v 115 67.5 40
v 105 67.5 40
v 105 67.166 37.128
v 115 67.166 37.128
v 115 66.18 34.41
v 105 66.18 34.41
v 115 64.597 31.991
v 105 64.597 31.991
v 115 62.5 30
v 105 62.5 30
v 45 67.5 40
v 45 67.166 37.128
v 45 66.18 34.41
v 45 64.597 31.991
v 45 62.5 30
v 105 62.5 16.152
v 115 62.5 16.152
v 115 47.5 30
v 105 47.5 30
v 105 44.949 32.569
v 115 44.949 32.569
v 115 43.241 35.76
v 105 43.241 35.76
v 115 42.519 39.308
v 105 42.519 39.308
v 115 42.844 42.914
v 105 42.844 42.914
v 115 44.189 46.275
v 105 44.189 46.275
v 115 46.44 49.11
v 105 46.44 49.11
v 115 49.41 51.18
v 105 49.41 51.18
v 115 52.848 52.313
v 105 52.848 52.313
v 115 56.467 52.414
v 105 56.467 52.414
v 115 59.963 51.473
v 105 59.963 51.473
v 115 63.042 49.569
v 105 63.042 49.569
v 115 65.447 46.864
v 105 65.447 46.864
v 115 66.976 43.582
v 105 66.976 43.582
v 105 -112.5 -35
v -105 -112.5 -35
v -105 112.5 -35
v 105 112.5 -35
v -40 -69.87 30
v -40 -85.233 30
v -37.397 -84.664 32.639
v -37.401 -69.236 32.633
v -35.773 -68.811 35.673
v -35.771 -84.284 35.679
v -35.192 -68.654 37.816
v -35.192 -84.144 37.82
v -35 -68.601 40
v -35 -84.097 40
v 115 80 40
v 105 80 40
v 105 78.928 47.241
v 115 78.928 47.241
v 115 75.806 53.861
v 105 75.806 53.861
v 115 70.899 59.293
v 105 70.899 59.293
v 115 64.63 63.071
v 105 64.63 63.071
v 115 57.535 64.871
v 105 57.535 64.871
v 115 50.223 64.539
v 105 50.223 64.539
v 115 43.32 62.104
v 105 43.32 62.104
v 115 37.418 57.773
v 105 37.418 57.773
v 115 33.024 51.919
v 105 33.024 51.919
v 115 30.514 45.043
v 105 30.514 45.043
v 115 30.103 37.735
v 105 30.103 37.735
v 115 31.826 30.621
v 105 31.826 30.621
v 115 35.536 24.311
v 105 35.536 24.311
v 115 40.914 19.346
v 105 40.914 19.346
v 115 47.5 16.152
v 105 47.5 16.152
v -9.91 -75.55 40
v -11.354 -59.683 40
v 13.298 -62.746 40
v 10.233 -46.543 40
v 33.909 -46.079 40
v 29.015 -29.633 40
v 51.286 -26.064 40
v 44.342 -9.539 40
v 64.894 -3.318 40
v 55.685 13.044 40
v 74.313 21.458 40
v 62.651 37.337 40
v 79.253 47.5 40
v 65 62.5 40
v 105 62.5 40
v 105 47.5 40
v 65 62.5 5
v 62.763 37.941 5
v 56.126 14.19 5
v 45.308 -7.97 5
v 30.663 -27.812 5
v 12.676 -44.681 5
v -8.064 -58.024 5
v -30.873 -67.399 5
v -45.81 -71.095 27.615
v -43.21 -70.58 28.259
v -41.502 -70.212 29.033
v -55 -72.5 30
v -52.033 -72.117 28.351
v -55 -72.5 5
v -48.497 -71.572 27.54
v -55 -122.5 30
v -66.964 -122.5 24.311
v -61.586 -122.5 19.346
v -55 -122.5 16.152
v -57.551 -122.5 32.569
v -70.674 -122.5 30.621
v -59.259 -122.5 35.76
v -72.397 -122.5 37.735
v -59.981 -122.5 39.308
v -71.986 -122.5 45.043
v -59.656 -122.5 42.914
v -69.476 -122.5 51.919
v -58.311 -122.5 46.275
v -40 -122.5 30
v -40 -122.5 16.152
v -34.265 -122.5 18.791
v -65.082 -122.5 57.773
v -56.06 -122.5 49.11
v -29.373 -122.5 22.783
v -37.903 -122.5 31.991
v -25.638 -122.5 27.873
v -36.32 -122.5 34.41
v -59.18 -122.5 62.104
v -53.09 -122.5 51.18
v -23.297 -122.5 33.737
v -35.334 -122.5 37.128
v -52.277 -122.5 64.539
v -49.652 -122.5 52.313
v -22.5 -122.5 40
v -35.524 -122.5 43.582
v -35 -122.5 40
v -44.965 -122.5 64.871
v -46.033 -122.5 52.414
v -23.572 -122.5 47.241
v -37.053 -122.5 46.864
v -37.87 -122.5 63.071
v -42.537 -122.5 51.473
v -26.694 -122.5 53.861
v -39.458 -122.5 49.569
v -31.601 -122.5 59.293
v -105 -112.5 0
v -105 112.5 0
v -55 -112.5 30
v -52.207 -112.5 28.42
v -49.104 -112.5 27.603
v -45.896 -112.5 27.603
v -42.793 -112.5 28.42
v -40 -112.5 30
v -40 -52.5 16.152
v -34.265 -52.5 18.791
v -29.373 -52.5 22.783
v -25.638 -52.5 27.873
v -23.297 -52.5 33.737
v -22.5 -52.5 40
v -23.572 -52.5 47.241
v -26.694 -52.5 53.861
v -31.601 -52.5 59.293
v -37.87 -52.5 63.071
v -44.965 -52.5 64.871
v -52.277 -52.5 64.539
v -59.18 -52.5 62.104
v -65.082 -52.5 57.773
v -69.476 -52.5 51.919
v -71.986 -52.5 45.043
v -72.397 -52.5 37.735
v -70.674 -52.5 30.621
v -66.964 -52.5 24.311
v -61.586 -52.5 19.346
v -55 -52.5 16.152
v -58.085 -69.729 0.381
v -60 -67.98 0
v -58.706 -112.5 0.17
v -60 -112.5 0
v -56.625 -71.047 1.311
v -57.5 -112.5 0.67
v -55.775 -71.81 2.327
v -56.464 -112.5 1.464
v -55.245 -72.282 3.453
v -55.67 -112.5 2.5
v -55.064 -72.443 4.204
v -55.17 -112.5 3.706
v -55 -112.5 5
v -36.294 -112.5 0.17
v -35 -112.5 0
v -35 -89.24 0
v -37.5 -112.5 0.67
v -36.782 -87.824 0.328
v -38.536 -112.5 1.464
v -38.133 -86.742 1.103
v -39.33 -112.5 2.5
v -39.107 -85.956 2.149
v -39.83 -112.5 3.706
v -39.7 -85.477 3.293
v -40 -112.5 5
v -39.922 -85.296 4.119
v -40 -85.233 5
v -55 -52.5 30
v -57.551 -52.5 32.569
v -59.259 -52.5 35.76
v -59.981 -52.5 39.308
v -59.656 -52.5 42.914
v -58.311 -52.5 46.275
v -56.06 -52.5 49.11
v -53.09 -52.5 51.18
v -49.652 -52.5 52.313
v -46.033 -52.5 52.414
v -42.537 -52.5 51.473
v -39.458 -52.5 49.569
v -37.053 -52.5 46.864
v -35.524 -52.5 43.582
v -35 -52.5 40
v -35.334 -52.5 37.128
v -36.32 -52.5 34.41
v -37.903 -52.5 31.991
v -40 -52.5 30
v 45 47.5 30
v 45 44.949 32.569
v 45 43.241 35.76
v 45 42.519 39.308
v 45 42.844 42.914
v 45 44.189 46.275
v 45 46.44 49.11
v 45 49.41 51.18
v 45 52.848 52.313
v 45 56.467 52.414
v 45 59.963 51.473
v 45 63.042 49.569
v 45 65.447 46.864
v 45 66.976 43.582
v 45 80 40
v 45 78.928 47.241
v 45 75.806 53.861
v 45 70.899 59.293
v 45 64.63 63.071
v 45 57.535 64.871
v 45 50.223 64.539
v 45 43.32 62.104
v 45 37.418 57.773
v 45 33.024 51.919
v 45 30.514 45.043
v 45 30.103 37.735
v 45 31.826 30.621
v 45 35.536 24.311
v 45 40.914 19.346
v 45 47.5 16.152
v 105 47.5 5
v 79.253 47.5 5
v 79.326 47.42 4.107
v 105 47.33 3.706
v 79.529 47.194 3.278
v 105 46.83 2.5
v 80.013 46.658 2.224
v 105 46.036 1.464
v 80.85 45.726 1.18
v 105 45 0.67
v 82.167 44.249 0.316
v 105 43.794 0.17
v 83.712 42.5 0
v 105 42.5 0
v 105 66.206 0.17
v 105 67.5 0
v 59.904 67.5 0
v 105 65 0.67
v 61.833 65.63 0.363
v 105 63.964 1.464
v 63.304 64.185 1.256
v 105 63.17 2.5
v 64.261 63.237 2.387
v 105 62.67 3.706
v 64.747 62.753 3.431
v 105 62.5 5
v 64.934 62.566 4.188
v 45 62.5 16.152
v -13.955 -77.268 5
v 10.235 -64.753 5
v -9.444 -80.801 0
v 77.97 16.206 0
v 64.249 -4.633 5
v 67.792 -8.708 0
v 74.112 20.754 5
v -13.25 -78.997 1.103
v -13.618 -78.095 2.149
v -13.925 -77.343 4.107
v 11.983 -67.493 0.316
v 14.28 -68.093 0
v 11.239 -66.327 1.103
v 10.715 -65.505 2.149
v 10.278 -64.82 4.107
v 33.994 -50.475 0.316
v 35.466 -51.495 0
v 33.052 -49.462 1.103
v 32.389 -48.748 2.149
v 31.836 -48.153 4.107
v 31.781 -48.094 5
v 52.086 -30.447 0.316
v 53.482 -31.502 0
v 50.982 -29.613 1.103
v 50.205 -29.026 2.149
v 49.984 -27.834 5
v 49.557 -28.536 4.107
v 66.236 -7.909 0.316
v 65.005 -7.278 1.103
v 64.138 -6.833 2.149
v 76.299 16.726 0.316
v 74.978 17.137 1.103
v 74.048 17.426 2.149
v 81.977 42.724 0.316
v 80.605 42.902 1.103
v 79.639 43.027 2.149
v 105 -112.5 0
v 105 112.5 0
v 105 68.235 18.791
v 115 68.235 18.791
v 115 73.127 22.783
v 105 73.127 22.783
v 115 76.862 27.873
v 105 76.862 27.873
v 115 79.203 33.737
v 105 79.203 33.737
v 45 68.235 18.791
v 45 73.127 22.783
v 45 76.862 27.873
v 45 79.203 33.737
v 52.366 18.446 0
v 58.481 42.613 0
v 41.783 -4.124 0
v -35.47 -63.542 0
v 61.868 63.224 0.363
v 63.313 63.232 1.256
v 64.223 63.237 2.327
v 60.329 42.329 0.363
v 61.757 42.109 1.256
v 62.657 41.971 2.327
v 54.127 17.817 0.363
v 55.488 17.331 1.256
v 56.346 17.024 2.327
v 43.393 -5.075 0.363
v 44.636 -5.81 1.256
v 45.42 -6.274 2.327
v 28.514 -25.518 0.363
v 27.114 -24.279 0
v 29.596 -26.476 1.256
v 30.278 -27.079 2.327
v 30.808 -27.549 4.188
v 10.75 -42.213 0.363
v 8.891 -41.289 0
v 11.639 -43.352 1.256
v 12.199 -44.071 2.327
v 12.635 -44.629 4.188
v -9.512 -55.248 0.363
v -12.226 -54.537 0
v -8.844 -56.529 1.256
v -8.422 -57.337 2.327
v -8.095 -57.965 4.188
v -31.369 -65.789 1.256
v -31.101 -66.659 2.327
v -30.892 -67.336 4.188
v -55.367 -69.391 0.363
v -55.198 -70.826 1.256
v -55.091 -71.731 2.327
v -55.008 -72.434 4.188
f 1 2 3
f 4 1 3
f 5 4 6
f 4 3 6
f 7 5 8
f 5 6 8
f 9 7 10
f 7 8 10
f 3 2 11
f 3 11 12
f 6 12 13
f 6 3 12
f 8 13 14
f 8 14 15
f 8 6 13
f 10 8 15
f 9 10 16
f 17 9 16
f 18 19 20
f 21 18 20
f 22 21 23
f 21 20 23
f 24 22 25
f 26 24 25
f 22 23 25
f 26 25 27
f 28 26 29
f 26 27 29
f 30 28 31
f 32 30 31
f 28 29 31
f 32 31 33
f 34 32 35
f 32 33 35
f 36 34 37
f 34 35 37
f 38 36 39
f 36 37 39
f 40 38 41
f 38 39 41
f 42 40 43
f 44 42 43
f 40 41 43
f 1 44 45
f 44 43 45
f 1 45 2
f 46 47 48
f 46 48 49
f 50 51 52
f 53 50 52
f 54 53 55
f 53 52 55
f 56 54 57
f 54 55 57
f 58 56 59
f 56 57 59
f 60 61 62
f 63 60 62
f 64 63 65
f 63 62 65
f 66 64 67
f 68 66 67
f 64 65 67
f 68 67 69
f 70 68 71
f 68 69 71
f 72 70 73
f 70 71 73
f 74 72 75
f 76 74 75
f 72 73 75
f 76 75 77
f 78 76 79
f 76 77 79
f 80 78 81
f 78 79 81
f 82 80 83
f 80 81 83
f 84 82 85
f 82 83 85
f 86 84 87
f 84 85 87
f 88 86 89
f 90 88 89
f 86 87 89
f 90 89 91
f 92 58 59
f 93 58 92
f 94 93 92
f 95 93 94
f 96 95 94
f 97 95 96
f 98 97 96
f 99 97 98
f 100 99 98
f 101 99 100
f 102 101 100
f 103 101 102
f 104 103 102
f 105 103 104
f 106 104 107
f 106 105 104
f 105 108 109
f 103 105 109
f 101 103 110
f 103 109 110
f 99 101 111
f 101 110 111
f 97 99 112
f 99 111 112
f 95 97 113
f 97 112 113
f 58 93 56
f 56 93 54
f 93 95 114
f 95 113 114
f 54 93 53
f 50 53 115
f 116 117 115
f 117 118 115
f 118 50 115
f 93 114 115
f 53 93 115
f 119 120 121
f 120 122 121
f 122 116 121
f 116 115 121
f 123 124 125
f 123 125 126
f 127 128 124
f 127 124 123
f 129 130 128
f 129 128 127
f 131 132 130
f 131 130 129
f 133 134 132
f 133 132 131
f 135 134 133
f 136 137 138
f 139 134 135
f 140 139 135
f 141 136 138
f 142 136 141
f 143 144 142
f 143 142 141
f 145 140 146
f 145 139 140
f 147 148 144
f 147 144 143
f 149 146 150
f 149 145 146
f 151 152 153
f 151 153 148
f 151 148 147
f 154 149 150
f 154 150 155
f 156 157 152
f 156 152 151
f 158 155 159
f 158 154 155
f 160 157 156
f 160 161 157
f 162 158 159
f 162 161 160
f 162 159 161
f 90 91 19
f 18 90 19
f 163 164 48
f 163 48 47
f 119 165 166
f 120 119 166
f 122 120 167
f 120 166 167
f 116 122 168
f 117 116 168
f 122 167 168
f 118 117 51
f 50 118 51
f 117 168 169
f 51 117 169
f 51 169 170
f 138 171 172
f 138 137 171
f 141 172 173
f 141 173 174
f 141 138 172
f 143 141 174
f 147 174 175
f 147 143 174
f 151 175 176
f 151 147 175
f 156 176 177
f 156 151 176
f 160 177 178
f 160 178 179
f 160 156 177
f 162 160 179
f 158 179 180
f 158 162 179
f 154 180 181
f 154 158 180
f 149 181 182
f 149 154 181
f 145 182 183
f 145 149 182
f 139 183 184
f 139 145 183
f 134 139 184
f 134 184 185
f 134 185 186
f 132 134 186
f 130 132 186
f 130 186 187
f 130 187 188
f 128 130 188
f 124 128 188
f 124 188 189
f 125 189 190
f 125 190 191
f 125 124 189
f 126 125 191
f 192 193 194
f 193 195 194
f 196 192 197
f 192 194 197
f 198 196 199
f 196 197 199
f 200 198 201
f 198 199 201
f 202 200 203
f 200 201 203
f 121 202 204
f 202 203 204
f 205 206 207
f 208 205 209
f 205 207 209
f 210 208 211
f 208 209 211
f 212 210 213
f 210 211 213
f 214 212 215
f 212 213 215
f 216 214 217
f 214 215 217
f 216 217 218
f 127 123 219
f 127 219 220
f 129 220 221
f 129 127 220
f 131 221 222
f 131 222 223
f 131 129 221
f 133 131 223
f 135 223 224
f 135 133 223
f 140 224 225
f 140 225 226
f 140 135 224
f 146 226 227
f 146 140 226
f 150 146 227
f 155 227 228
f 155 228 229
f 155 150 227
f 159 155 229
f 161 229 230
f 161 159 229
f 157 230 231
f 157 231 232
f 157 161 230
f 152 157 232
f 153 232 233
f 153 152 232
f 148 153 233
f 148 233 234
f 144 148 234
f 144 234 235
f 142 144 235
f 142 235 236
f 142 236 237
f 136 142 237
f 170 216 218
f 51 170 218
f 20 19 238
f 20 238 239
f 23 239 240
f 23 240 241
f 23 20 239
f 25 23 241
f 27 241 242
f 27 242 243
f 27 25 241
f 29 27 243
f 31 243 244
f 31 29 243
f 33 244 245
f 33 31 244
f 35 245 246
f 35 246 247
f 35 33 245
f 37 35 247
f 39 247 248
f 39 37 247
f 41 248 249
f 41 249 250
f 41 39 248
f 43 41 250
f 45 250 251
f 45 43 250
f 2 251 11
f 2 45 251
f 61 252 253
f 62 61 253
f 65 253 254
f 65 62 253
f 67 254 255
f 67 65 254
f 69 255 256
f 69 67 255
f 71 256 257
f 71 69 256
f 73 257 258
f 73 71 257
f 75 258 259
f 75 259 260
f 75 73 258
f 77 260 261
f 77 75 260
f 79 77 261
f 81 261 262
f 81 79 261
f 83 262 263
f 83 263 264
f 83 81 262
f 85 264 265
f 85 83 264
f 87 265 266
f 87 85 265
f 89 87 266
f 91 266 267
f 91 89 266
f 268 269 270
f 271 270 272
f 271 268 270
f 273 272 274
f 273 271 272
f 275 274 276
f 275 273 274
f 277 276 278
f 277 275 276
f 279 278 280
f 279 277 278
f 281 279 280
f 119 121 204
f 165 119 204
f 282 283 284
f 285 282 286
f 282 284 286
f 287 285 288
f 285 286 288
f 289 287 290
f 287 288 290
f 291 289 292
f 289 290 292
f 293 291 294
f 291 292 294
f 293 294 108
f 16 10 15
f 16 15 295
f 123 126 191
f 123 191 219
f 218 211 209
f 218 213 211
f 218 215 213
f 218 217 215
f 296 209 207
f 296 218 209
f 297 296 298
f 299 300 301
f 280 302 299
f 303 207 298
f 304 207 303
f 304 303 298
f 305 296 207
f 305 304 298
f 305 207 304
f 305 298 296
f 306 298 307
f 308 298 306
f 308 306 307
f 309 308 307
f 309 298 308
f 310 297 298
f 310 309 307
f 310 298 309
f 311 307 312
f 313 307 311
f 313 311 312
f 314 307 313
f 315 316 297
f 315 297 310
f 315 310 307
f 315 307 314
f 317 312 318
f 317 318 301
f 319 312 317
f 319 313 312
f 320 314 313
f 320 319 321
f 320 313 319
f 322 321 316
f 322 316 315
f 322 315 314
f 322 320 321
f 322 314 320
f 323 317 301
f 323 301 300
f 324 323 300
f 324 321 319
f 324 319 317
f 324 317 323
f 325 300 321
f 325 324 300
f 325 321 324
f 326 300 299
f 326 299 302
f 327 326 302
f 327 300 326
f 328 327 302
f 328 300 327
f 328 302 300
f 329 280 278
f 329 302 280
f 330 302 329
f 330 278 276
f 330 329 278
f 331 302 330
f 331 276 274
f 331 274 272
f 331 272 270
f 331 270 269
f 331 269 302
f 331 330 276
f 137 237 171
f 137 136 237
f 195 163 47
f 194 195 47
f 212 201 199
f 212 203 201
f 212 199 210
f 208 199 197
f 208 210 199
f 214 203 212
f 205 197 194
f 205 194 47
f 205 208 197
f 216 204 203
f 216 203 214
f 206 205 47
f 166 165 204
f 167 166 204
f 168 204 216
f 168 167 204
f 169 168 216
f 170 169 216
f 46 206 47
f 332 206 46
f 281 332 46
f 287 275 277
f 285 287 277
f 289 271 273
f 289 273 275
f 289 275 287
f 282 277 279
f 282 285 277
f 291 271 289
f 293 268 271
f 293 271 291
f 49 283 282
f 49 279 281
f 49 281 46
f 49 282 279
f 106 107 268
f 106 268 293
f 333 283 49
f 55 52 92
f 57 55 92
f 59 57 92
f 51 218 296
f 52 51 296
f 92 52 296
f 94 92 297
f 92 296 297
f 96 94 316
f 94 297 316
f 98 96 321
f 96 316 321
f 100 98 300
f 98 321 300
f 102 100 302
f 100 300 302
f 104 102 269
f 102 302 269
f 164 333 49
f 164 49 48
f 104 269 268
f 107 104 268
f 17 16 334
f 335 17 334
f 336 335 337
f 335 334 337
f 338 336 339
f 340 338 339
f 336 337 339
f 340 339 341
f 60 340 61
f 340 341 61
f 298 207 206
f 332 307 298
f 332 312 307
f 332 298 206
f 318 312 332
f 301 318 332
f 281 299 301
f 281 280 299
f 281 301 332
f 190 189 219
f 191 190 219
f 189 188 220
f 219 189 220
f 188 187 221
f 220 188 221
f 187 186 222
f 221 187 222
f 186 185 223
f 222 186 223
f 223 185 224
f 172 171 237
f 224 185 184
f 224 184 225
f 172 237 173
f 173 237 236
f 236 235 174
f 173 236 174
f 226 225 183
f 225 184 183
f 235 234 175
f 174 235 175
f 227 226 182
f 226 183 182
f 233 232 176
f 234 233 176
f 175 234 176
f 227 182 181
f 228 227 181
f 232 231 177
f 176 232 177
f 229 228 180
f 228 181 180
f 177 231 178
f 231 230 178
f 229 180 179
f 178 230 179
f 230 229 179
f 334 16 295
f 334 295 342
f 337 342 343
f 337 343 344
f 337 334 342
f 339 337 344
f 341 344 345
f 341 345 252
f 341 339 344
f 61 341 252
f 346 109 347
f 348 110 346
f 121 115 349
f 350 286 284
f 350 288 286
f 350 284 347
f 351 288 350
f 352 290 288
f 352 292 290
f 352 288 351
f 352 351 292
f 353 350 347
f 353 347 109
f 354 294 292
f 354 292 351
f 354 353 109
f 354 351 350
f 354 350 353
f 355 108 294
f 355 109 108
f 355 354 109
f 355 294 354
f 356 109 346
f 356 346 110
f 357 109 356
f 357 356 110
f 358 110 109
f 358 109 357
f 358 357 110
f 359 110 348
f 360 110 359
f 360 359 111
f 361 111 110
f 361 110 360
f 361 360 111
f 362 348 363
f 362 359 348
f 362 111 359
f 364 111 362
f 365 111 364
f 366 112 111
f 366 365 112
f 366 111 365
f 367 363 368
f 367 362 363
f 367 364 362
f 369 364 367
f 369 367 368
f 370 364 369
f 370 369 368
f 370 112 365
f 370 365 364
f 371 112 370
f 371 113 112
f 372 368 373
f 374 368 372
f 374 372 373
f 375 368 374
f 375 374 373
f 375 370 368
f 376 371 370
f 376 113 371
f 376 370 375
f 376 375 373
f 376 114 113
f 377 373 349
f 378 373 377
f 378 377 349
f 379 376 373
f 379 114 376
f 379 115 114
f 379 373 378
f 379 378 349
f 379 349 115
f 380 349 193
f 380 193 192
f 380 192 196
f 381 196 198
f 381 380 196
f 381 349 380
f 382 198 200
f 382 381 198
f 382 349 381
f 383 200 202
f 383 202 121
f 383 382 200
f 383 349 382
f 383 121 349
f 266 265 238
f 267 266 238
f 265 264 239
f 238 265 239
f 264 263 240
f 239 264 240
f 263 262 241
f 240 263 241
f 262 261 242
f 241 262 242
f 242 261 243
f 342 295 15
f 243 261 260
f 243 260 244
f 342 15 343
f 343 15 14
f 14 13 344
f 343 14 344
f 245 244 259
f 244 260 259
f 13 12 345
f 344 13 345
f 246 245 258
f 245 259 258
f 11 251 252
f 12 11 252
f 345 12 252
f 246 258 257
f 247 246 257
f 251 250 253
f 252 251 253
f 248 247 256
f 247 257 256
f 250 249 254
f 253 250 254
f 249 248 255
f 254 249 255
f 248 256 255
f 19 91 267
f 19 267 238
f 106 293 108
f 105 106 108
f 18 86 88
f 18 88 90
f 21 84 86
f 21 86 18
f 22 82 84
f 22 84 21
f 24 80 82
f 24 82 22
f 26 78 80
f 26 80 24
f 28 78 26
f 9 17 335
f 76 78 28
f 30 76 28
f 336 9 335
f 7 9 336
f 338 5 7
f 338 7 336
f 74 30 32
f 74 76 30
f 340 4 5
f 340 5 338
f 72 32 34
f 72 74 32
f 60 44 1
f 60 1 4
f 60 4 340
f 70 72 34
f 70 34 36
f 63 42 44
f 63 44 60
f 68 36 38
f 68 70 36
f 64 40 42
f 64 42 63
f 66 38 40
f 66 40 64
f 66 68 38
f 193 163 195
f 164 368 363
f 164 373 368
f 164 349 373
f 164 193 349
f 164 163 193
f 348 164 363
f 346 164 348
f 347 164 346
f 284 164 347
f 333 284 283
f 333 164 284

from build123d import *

# Parameters (mm, degrees)
F1_DEPTH      = 40
F2_DEPTH      = 35
F4_DEPTH      = 10
F4_DEPTH_BACK = 60
F5_DEPTH      = 50
F7_DEPTH      = 10
F7_DEPTH_BACK = 60
F8_R          = 5


with BuildPart() as f1:
    # F0 (on Top) → F1 (new body)
    with BuildSketch(Plane.XY):
        with BuildLine():
            Line((105, 47.5), (105, 62.5))
            Line((105, 62.5), (65, 62.5))
            ThreePointArc((65, 62.5), (30.6634542586, -27.8119593409), (-55, -72.5))
            Line((-55, -72.5), (-55, -112.5))
            Line((-55, -112.5), (-40, -112.5))
            Line((-40, -112.5), (-40, -85.2328670269))
            ThreePointArc((-40, -85.2328670269), (41.3403887056, -38.3751932542), (79.2528089625, 47.5))
            Line((79.2528089625, 47.5), (105, 47.5))
        make_face()
    extrude(amount=F1_DEPTH)

    # F0 (on Top) → F2 (join)
    with BuildSketch(Plane.XY):
        with BuildLine():
            Line((105, 62.5), (105, 112.5))
            Line((105, 112.5), (-105, 112.5))
            Line((-105, 112.5), (-105, -112.5))
            Line((-105, -112.5), (-55, -112.5))
            Line((-55, -112.5), (-55, -72.5))
            ThreePointArc((-55, -72.5), (30.6634542586, -27.8119593409), (65, 62.5))
            Line((65, 62.5), (105, 62.5))
        make_face()
        with BuildLine():
            Line((105, 47.5), (105, 62.5))
            Line((105, 62.5), (65, 62.5))
            ThreePointArc((65, 62.5), (30.6634542586, -27.8119593409), (-55, -72.5))
            Line((-55, -72.5), (-55, -112.5))
            Line((-55, -112.5), (-40, -112.5))
            Line((-40, -112.5), (-40, -85.2328670269))
            ThreePointArc((-40, -85.2328670269), (41.3403887056, -38.3751932542), (79.2528089625, 47.5))
            Line((79.2528089625, 47.5), (105, 47.5))
        make_face()
        with BuildLine():
            Line((105, -112.5), (105, 47.5))
            Line((105, 47.5), (79.2528089625, 47.5))
            ThreePointArc((79.2528089625, 47.5), (41.3403887056, -38.3751932542), (-40, -85.2328670269))
            Line((-40, -85.2328670269), (-40, -112.5))
            Line((-40, -112.5), (105, -112.5))
        make_face()
    extrude(amount=-F2_DEPTH)

    # F3 (on face) → F5 (cut)
    with BuildSketch(Plane.XZ.offset(112.5)):
        with BuildLine():
            ThreePointArc((-35, 40), (-53.0901699437, 51.1803398875), (-55, 30))
            Line((-55, 30), (-55, 40))
            Line((-55, 40), (-40, 40))
            Line((-40, 40), (-40, 30))
            ThreePointArc((-40, 30), (-36.3196601125, 34.4098300563), (-35, 40))
        make_face()
        with BuildLine():
            Line((-55, 40), (-55, 30))
            ThreePointArc((-55, 30), (-47.5, 27.5), (-40, 30))
            Line((-40, 30), (-40, 40))
            Line((-40, 40), (-55, 40))
        make_face()
    extrude(amount=-F5_DEPTH, mode=Mode.SUBTRACT)

    # F8
    f8_edges = [f1.edges().sort_by_distance(p)[0] for p in [
        (41.340389, -38.375193, 0),
        (-40, -98.866434, 0),
        (92.126404, 47.5, 0),
        (30.663454, -27.811959, 0),
        (85, 62.5, 0),
        (-55, -92.5, 0),
    ]]
    fillet(f8_edges, radius=F8_R)


with BuildPart() as f4:
    # F3 (on face) → F4 (new body, two sides)
    with BuildSketch(Plane.XZ.offset(112.5)) as f4_sk:
        with BuildLine():
            ThreePointArc((-40, 16.1515199646), (-27.3443556293, 25.2098005423), (-22.5, 40))
            ThreePointArc((-22.5, 40), (-62.2901994577, 60.1556443707), (-55, 16.1515199646))
            Line((-55, 16.1515199646), (-55, 30))
            ThreePointArc((-55, 30), (-53.0901699437, 51.1803398875), (-35, 40))
            ThreePointArc((-35, 40), (-36.3196601125, 34.4098300563), (-40, 30))
            Line((-40, 30), (-40, 16.1515199646))
        make_face()
    extrude(amount=F4_DEPTH)
    extrude(f4_sk.sketch, amount=-F4_DEPTH_BACK)


with BuildPart() as f7:
    # F6 (on face) → F7 (new body, two sides)
    with BuildSketch(Plane.YZ.offset(105)) as f7_sk:
        with BuildLine():
            ThreePointArc((47.5, 30), (49.4098300563, 51.1803398875), (67.5, 40))
            ThreePointArc((67.5, 40), (66.1803398875, 34.4098300563), (62.5, 30))
            Line((62.5, 30), (62.5, 16.1515199646))
            ThreePointArc((62.5, 16.1515199646), (75.1556443707, 25.2098005423), (80, 40))
            ThreePointArc((80, 40), (40.2098005423, 60.1556443707), (47.5, 16.1515199646))
            Line((47.5, 16.1515199646), (47.5, 30))
        make_face()
    extrude(amount=F7_DEPTH)
    extrude(f7_sk.sketch, amount=-F7_DEPTH_BACK)


solid = Compound([f1.part, f4.part, f7.part])
